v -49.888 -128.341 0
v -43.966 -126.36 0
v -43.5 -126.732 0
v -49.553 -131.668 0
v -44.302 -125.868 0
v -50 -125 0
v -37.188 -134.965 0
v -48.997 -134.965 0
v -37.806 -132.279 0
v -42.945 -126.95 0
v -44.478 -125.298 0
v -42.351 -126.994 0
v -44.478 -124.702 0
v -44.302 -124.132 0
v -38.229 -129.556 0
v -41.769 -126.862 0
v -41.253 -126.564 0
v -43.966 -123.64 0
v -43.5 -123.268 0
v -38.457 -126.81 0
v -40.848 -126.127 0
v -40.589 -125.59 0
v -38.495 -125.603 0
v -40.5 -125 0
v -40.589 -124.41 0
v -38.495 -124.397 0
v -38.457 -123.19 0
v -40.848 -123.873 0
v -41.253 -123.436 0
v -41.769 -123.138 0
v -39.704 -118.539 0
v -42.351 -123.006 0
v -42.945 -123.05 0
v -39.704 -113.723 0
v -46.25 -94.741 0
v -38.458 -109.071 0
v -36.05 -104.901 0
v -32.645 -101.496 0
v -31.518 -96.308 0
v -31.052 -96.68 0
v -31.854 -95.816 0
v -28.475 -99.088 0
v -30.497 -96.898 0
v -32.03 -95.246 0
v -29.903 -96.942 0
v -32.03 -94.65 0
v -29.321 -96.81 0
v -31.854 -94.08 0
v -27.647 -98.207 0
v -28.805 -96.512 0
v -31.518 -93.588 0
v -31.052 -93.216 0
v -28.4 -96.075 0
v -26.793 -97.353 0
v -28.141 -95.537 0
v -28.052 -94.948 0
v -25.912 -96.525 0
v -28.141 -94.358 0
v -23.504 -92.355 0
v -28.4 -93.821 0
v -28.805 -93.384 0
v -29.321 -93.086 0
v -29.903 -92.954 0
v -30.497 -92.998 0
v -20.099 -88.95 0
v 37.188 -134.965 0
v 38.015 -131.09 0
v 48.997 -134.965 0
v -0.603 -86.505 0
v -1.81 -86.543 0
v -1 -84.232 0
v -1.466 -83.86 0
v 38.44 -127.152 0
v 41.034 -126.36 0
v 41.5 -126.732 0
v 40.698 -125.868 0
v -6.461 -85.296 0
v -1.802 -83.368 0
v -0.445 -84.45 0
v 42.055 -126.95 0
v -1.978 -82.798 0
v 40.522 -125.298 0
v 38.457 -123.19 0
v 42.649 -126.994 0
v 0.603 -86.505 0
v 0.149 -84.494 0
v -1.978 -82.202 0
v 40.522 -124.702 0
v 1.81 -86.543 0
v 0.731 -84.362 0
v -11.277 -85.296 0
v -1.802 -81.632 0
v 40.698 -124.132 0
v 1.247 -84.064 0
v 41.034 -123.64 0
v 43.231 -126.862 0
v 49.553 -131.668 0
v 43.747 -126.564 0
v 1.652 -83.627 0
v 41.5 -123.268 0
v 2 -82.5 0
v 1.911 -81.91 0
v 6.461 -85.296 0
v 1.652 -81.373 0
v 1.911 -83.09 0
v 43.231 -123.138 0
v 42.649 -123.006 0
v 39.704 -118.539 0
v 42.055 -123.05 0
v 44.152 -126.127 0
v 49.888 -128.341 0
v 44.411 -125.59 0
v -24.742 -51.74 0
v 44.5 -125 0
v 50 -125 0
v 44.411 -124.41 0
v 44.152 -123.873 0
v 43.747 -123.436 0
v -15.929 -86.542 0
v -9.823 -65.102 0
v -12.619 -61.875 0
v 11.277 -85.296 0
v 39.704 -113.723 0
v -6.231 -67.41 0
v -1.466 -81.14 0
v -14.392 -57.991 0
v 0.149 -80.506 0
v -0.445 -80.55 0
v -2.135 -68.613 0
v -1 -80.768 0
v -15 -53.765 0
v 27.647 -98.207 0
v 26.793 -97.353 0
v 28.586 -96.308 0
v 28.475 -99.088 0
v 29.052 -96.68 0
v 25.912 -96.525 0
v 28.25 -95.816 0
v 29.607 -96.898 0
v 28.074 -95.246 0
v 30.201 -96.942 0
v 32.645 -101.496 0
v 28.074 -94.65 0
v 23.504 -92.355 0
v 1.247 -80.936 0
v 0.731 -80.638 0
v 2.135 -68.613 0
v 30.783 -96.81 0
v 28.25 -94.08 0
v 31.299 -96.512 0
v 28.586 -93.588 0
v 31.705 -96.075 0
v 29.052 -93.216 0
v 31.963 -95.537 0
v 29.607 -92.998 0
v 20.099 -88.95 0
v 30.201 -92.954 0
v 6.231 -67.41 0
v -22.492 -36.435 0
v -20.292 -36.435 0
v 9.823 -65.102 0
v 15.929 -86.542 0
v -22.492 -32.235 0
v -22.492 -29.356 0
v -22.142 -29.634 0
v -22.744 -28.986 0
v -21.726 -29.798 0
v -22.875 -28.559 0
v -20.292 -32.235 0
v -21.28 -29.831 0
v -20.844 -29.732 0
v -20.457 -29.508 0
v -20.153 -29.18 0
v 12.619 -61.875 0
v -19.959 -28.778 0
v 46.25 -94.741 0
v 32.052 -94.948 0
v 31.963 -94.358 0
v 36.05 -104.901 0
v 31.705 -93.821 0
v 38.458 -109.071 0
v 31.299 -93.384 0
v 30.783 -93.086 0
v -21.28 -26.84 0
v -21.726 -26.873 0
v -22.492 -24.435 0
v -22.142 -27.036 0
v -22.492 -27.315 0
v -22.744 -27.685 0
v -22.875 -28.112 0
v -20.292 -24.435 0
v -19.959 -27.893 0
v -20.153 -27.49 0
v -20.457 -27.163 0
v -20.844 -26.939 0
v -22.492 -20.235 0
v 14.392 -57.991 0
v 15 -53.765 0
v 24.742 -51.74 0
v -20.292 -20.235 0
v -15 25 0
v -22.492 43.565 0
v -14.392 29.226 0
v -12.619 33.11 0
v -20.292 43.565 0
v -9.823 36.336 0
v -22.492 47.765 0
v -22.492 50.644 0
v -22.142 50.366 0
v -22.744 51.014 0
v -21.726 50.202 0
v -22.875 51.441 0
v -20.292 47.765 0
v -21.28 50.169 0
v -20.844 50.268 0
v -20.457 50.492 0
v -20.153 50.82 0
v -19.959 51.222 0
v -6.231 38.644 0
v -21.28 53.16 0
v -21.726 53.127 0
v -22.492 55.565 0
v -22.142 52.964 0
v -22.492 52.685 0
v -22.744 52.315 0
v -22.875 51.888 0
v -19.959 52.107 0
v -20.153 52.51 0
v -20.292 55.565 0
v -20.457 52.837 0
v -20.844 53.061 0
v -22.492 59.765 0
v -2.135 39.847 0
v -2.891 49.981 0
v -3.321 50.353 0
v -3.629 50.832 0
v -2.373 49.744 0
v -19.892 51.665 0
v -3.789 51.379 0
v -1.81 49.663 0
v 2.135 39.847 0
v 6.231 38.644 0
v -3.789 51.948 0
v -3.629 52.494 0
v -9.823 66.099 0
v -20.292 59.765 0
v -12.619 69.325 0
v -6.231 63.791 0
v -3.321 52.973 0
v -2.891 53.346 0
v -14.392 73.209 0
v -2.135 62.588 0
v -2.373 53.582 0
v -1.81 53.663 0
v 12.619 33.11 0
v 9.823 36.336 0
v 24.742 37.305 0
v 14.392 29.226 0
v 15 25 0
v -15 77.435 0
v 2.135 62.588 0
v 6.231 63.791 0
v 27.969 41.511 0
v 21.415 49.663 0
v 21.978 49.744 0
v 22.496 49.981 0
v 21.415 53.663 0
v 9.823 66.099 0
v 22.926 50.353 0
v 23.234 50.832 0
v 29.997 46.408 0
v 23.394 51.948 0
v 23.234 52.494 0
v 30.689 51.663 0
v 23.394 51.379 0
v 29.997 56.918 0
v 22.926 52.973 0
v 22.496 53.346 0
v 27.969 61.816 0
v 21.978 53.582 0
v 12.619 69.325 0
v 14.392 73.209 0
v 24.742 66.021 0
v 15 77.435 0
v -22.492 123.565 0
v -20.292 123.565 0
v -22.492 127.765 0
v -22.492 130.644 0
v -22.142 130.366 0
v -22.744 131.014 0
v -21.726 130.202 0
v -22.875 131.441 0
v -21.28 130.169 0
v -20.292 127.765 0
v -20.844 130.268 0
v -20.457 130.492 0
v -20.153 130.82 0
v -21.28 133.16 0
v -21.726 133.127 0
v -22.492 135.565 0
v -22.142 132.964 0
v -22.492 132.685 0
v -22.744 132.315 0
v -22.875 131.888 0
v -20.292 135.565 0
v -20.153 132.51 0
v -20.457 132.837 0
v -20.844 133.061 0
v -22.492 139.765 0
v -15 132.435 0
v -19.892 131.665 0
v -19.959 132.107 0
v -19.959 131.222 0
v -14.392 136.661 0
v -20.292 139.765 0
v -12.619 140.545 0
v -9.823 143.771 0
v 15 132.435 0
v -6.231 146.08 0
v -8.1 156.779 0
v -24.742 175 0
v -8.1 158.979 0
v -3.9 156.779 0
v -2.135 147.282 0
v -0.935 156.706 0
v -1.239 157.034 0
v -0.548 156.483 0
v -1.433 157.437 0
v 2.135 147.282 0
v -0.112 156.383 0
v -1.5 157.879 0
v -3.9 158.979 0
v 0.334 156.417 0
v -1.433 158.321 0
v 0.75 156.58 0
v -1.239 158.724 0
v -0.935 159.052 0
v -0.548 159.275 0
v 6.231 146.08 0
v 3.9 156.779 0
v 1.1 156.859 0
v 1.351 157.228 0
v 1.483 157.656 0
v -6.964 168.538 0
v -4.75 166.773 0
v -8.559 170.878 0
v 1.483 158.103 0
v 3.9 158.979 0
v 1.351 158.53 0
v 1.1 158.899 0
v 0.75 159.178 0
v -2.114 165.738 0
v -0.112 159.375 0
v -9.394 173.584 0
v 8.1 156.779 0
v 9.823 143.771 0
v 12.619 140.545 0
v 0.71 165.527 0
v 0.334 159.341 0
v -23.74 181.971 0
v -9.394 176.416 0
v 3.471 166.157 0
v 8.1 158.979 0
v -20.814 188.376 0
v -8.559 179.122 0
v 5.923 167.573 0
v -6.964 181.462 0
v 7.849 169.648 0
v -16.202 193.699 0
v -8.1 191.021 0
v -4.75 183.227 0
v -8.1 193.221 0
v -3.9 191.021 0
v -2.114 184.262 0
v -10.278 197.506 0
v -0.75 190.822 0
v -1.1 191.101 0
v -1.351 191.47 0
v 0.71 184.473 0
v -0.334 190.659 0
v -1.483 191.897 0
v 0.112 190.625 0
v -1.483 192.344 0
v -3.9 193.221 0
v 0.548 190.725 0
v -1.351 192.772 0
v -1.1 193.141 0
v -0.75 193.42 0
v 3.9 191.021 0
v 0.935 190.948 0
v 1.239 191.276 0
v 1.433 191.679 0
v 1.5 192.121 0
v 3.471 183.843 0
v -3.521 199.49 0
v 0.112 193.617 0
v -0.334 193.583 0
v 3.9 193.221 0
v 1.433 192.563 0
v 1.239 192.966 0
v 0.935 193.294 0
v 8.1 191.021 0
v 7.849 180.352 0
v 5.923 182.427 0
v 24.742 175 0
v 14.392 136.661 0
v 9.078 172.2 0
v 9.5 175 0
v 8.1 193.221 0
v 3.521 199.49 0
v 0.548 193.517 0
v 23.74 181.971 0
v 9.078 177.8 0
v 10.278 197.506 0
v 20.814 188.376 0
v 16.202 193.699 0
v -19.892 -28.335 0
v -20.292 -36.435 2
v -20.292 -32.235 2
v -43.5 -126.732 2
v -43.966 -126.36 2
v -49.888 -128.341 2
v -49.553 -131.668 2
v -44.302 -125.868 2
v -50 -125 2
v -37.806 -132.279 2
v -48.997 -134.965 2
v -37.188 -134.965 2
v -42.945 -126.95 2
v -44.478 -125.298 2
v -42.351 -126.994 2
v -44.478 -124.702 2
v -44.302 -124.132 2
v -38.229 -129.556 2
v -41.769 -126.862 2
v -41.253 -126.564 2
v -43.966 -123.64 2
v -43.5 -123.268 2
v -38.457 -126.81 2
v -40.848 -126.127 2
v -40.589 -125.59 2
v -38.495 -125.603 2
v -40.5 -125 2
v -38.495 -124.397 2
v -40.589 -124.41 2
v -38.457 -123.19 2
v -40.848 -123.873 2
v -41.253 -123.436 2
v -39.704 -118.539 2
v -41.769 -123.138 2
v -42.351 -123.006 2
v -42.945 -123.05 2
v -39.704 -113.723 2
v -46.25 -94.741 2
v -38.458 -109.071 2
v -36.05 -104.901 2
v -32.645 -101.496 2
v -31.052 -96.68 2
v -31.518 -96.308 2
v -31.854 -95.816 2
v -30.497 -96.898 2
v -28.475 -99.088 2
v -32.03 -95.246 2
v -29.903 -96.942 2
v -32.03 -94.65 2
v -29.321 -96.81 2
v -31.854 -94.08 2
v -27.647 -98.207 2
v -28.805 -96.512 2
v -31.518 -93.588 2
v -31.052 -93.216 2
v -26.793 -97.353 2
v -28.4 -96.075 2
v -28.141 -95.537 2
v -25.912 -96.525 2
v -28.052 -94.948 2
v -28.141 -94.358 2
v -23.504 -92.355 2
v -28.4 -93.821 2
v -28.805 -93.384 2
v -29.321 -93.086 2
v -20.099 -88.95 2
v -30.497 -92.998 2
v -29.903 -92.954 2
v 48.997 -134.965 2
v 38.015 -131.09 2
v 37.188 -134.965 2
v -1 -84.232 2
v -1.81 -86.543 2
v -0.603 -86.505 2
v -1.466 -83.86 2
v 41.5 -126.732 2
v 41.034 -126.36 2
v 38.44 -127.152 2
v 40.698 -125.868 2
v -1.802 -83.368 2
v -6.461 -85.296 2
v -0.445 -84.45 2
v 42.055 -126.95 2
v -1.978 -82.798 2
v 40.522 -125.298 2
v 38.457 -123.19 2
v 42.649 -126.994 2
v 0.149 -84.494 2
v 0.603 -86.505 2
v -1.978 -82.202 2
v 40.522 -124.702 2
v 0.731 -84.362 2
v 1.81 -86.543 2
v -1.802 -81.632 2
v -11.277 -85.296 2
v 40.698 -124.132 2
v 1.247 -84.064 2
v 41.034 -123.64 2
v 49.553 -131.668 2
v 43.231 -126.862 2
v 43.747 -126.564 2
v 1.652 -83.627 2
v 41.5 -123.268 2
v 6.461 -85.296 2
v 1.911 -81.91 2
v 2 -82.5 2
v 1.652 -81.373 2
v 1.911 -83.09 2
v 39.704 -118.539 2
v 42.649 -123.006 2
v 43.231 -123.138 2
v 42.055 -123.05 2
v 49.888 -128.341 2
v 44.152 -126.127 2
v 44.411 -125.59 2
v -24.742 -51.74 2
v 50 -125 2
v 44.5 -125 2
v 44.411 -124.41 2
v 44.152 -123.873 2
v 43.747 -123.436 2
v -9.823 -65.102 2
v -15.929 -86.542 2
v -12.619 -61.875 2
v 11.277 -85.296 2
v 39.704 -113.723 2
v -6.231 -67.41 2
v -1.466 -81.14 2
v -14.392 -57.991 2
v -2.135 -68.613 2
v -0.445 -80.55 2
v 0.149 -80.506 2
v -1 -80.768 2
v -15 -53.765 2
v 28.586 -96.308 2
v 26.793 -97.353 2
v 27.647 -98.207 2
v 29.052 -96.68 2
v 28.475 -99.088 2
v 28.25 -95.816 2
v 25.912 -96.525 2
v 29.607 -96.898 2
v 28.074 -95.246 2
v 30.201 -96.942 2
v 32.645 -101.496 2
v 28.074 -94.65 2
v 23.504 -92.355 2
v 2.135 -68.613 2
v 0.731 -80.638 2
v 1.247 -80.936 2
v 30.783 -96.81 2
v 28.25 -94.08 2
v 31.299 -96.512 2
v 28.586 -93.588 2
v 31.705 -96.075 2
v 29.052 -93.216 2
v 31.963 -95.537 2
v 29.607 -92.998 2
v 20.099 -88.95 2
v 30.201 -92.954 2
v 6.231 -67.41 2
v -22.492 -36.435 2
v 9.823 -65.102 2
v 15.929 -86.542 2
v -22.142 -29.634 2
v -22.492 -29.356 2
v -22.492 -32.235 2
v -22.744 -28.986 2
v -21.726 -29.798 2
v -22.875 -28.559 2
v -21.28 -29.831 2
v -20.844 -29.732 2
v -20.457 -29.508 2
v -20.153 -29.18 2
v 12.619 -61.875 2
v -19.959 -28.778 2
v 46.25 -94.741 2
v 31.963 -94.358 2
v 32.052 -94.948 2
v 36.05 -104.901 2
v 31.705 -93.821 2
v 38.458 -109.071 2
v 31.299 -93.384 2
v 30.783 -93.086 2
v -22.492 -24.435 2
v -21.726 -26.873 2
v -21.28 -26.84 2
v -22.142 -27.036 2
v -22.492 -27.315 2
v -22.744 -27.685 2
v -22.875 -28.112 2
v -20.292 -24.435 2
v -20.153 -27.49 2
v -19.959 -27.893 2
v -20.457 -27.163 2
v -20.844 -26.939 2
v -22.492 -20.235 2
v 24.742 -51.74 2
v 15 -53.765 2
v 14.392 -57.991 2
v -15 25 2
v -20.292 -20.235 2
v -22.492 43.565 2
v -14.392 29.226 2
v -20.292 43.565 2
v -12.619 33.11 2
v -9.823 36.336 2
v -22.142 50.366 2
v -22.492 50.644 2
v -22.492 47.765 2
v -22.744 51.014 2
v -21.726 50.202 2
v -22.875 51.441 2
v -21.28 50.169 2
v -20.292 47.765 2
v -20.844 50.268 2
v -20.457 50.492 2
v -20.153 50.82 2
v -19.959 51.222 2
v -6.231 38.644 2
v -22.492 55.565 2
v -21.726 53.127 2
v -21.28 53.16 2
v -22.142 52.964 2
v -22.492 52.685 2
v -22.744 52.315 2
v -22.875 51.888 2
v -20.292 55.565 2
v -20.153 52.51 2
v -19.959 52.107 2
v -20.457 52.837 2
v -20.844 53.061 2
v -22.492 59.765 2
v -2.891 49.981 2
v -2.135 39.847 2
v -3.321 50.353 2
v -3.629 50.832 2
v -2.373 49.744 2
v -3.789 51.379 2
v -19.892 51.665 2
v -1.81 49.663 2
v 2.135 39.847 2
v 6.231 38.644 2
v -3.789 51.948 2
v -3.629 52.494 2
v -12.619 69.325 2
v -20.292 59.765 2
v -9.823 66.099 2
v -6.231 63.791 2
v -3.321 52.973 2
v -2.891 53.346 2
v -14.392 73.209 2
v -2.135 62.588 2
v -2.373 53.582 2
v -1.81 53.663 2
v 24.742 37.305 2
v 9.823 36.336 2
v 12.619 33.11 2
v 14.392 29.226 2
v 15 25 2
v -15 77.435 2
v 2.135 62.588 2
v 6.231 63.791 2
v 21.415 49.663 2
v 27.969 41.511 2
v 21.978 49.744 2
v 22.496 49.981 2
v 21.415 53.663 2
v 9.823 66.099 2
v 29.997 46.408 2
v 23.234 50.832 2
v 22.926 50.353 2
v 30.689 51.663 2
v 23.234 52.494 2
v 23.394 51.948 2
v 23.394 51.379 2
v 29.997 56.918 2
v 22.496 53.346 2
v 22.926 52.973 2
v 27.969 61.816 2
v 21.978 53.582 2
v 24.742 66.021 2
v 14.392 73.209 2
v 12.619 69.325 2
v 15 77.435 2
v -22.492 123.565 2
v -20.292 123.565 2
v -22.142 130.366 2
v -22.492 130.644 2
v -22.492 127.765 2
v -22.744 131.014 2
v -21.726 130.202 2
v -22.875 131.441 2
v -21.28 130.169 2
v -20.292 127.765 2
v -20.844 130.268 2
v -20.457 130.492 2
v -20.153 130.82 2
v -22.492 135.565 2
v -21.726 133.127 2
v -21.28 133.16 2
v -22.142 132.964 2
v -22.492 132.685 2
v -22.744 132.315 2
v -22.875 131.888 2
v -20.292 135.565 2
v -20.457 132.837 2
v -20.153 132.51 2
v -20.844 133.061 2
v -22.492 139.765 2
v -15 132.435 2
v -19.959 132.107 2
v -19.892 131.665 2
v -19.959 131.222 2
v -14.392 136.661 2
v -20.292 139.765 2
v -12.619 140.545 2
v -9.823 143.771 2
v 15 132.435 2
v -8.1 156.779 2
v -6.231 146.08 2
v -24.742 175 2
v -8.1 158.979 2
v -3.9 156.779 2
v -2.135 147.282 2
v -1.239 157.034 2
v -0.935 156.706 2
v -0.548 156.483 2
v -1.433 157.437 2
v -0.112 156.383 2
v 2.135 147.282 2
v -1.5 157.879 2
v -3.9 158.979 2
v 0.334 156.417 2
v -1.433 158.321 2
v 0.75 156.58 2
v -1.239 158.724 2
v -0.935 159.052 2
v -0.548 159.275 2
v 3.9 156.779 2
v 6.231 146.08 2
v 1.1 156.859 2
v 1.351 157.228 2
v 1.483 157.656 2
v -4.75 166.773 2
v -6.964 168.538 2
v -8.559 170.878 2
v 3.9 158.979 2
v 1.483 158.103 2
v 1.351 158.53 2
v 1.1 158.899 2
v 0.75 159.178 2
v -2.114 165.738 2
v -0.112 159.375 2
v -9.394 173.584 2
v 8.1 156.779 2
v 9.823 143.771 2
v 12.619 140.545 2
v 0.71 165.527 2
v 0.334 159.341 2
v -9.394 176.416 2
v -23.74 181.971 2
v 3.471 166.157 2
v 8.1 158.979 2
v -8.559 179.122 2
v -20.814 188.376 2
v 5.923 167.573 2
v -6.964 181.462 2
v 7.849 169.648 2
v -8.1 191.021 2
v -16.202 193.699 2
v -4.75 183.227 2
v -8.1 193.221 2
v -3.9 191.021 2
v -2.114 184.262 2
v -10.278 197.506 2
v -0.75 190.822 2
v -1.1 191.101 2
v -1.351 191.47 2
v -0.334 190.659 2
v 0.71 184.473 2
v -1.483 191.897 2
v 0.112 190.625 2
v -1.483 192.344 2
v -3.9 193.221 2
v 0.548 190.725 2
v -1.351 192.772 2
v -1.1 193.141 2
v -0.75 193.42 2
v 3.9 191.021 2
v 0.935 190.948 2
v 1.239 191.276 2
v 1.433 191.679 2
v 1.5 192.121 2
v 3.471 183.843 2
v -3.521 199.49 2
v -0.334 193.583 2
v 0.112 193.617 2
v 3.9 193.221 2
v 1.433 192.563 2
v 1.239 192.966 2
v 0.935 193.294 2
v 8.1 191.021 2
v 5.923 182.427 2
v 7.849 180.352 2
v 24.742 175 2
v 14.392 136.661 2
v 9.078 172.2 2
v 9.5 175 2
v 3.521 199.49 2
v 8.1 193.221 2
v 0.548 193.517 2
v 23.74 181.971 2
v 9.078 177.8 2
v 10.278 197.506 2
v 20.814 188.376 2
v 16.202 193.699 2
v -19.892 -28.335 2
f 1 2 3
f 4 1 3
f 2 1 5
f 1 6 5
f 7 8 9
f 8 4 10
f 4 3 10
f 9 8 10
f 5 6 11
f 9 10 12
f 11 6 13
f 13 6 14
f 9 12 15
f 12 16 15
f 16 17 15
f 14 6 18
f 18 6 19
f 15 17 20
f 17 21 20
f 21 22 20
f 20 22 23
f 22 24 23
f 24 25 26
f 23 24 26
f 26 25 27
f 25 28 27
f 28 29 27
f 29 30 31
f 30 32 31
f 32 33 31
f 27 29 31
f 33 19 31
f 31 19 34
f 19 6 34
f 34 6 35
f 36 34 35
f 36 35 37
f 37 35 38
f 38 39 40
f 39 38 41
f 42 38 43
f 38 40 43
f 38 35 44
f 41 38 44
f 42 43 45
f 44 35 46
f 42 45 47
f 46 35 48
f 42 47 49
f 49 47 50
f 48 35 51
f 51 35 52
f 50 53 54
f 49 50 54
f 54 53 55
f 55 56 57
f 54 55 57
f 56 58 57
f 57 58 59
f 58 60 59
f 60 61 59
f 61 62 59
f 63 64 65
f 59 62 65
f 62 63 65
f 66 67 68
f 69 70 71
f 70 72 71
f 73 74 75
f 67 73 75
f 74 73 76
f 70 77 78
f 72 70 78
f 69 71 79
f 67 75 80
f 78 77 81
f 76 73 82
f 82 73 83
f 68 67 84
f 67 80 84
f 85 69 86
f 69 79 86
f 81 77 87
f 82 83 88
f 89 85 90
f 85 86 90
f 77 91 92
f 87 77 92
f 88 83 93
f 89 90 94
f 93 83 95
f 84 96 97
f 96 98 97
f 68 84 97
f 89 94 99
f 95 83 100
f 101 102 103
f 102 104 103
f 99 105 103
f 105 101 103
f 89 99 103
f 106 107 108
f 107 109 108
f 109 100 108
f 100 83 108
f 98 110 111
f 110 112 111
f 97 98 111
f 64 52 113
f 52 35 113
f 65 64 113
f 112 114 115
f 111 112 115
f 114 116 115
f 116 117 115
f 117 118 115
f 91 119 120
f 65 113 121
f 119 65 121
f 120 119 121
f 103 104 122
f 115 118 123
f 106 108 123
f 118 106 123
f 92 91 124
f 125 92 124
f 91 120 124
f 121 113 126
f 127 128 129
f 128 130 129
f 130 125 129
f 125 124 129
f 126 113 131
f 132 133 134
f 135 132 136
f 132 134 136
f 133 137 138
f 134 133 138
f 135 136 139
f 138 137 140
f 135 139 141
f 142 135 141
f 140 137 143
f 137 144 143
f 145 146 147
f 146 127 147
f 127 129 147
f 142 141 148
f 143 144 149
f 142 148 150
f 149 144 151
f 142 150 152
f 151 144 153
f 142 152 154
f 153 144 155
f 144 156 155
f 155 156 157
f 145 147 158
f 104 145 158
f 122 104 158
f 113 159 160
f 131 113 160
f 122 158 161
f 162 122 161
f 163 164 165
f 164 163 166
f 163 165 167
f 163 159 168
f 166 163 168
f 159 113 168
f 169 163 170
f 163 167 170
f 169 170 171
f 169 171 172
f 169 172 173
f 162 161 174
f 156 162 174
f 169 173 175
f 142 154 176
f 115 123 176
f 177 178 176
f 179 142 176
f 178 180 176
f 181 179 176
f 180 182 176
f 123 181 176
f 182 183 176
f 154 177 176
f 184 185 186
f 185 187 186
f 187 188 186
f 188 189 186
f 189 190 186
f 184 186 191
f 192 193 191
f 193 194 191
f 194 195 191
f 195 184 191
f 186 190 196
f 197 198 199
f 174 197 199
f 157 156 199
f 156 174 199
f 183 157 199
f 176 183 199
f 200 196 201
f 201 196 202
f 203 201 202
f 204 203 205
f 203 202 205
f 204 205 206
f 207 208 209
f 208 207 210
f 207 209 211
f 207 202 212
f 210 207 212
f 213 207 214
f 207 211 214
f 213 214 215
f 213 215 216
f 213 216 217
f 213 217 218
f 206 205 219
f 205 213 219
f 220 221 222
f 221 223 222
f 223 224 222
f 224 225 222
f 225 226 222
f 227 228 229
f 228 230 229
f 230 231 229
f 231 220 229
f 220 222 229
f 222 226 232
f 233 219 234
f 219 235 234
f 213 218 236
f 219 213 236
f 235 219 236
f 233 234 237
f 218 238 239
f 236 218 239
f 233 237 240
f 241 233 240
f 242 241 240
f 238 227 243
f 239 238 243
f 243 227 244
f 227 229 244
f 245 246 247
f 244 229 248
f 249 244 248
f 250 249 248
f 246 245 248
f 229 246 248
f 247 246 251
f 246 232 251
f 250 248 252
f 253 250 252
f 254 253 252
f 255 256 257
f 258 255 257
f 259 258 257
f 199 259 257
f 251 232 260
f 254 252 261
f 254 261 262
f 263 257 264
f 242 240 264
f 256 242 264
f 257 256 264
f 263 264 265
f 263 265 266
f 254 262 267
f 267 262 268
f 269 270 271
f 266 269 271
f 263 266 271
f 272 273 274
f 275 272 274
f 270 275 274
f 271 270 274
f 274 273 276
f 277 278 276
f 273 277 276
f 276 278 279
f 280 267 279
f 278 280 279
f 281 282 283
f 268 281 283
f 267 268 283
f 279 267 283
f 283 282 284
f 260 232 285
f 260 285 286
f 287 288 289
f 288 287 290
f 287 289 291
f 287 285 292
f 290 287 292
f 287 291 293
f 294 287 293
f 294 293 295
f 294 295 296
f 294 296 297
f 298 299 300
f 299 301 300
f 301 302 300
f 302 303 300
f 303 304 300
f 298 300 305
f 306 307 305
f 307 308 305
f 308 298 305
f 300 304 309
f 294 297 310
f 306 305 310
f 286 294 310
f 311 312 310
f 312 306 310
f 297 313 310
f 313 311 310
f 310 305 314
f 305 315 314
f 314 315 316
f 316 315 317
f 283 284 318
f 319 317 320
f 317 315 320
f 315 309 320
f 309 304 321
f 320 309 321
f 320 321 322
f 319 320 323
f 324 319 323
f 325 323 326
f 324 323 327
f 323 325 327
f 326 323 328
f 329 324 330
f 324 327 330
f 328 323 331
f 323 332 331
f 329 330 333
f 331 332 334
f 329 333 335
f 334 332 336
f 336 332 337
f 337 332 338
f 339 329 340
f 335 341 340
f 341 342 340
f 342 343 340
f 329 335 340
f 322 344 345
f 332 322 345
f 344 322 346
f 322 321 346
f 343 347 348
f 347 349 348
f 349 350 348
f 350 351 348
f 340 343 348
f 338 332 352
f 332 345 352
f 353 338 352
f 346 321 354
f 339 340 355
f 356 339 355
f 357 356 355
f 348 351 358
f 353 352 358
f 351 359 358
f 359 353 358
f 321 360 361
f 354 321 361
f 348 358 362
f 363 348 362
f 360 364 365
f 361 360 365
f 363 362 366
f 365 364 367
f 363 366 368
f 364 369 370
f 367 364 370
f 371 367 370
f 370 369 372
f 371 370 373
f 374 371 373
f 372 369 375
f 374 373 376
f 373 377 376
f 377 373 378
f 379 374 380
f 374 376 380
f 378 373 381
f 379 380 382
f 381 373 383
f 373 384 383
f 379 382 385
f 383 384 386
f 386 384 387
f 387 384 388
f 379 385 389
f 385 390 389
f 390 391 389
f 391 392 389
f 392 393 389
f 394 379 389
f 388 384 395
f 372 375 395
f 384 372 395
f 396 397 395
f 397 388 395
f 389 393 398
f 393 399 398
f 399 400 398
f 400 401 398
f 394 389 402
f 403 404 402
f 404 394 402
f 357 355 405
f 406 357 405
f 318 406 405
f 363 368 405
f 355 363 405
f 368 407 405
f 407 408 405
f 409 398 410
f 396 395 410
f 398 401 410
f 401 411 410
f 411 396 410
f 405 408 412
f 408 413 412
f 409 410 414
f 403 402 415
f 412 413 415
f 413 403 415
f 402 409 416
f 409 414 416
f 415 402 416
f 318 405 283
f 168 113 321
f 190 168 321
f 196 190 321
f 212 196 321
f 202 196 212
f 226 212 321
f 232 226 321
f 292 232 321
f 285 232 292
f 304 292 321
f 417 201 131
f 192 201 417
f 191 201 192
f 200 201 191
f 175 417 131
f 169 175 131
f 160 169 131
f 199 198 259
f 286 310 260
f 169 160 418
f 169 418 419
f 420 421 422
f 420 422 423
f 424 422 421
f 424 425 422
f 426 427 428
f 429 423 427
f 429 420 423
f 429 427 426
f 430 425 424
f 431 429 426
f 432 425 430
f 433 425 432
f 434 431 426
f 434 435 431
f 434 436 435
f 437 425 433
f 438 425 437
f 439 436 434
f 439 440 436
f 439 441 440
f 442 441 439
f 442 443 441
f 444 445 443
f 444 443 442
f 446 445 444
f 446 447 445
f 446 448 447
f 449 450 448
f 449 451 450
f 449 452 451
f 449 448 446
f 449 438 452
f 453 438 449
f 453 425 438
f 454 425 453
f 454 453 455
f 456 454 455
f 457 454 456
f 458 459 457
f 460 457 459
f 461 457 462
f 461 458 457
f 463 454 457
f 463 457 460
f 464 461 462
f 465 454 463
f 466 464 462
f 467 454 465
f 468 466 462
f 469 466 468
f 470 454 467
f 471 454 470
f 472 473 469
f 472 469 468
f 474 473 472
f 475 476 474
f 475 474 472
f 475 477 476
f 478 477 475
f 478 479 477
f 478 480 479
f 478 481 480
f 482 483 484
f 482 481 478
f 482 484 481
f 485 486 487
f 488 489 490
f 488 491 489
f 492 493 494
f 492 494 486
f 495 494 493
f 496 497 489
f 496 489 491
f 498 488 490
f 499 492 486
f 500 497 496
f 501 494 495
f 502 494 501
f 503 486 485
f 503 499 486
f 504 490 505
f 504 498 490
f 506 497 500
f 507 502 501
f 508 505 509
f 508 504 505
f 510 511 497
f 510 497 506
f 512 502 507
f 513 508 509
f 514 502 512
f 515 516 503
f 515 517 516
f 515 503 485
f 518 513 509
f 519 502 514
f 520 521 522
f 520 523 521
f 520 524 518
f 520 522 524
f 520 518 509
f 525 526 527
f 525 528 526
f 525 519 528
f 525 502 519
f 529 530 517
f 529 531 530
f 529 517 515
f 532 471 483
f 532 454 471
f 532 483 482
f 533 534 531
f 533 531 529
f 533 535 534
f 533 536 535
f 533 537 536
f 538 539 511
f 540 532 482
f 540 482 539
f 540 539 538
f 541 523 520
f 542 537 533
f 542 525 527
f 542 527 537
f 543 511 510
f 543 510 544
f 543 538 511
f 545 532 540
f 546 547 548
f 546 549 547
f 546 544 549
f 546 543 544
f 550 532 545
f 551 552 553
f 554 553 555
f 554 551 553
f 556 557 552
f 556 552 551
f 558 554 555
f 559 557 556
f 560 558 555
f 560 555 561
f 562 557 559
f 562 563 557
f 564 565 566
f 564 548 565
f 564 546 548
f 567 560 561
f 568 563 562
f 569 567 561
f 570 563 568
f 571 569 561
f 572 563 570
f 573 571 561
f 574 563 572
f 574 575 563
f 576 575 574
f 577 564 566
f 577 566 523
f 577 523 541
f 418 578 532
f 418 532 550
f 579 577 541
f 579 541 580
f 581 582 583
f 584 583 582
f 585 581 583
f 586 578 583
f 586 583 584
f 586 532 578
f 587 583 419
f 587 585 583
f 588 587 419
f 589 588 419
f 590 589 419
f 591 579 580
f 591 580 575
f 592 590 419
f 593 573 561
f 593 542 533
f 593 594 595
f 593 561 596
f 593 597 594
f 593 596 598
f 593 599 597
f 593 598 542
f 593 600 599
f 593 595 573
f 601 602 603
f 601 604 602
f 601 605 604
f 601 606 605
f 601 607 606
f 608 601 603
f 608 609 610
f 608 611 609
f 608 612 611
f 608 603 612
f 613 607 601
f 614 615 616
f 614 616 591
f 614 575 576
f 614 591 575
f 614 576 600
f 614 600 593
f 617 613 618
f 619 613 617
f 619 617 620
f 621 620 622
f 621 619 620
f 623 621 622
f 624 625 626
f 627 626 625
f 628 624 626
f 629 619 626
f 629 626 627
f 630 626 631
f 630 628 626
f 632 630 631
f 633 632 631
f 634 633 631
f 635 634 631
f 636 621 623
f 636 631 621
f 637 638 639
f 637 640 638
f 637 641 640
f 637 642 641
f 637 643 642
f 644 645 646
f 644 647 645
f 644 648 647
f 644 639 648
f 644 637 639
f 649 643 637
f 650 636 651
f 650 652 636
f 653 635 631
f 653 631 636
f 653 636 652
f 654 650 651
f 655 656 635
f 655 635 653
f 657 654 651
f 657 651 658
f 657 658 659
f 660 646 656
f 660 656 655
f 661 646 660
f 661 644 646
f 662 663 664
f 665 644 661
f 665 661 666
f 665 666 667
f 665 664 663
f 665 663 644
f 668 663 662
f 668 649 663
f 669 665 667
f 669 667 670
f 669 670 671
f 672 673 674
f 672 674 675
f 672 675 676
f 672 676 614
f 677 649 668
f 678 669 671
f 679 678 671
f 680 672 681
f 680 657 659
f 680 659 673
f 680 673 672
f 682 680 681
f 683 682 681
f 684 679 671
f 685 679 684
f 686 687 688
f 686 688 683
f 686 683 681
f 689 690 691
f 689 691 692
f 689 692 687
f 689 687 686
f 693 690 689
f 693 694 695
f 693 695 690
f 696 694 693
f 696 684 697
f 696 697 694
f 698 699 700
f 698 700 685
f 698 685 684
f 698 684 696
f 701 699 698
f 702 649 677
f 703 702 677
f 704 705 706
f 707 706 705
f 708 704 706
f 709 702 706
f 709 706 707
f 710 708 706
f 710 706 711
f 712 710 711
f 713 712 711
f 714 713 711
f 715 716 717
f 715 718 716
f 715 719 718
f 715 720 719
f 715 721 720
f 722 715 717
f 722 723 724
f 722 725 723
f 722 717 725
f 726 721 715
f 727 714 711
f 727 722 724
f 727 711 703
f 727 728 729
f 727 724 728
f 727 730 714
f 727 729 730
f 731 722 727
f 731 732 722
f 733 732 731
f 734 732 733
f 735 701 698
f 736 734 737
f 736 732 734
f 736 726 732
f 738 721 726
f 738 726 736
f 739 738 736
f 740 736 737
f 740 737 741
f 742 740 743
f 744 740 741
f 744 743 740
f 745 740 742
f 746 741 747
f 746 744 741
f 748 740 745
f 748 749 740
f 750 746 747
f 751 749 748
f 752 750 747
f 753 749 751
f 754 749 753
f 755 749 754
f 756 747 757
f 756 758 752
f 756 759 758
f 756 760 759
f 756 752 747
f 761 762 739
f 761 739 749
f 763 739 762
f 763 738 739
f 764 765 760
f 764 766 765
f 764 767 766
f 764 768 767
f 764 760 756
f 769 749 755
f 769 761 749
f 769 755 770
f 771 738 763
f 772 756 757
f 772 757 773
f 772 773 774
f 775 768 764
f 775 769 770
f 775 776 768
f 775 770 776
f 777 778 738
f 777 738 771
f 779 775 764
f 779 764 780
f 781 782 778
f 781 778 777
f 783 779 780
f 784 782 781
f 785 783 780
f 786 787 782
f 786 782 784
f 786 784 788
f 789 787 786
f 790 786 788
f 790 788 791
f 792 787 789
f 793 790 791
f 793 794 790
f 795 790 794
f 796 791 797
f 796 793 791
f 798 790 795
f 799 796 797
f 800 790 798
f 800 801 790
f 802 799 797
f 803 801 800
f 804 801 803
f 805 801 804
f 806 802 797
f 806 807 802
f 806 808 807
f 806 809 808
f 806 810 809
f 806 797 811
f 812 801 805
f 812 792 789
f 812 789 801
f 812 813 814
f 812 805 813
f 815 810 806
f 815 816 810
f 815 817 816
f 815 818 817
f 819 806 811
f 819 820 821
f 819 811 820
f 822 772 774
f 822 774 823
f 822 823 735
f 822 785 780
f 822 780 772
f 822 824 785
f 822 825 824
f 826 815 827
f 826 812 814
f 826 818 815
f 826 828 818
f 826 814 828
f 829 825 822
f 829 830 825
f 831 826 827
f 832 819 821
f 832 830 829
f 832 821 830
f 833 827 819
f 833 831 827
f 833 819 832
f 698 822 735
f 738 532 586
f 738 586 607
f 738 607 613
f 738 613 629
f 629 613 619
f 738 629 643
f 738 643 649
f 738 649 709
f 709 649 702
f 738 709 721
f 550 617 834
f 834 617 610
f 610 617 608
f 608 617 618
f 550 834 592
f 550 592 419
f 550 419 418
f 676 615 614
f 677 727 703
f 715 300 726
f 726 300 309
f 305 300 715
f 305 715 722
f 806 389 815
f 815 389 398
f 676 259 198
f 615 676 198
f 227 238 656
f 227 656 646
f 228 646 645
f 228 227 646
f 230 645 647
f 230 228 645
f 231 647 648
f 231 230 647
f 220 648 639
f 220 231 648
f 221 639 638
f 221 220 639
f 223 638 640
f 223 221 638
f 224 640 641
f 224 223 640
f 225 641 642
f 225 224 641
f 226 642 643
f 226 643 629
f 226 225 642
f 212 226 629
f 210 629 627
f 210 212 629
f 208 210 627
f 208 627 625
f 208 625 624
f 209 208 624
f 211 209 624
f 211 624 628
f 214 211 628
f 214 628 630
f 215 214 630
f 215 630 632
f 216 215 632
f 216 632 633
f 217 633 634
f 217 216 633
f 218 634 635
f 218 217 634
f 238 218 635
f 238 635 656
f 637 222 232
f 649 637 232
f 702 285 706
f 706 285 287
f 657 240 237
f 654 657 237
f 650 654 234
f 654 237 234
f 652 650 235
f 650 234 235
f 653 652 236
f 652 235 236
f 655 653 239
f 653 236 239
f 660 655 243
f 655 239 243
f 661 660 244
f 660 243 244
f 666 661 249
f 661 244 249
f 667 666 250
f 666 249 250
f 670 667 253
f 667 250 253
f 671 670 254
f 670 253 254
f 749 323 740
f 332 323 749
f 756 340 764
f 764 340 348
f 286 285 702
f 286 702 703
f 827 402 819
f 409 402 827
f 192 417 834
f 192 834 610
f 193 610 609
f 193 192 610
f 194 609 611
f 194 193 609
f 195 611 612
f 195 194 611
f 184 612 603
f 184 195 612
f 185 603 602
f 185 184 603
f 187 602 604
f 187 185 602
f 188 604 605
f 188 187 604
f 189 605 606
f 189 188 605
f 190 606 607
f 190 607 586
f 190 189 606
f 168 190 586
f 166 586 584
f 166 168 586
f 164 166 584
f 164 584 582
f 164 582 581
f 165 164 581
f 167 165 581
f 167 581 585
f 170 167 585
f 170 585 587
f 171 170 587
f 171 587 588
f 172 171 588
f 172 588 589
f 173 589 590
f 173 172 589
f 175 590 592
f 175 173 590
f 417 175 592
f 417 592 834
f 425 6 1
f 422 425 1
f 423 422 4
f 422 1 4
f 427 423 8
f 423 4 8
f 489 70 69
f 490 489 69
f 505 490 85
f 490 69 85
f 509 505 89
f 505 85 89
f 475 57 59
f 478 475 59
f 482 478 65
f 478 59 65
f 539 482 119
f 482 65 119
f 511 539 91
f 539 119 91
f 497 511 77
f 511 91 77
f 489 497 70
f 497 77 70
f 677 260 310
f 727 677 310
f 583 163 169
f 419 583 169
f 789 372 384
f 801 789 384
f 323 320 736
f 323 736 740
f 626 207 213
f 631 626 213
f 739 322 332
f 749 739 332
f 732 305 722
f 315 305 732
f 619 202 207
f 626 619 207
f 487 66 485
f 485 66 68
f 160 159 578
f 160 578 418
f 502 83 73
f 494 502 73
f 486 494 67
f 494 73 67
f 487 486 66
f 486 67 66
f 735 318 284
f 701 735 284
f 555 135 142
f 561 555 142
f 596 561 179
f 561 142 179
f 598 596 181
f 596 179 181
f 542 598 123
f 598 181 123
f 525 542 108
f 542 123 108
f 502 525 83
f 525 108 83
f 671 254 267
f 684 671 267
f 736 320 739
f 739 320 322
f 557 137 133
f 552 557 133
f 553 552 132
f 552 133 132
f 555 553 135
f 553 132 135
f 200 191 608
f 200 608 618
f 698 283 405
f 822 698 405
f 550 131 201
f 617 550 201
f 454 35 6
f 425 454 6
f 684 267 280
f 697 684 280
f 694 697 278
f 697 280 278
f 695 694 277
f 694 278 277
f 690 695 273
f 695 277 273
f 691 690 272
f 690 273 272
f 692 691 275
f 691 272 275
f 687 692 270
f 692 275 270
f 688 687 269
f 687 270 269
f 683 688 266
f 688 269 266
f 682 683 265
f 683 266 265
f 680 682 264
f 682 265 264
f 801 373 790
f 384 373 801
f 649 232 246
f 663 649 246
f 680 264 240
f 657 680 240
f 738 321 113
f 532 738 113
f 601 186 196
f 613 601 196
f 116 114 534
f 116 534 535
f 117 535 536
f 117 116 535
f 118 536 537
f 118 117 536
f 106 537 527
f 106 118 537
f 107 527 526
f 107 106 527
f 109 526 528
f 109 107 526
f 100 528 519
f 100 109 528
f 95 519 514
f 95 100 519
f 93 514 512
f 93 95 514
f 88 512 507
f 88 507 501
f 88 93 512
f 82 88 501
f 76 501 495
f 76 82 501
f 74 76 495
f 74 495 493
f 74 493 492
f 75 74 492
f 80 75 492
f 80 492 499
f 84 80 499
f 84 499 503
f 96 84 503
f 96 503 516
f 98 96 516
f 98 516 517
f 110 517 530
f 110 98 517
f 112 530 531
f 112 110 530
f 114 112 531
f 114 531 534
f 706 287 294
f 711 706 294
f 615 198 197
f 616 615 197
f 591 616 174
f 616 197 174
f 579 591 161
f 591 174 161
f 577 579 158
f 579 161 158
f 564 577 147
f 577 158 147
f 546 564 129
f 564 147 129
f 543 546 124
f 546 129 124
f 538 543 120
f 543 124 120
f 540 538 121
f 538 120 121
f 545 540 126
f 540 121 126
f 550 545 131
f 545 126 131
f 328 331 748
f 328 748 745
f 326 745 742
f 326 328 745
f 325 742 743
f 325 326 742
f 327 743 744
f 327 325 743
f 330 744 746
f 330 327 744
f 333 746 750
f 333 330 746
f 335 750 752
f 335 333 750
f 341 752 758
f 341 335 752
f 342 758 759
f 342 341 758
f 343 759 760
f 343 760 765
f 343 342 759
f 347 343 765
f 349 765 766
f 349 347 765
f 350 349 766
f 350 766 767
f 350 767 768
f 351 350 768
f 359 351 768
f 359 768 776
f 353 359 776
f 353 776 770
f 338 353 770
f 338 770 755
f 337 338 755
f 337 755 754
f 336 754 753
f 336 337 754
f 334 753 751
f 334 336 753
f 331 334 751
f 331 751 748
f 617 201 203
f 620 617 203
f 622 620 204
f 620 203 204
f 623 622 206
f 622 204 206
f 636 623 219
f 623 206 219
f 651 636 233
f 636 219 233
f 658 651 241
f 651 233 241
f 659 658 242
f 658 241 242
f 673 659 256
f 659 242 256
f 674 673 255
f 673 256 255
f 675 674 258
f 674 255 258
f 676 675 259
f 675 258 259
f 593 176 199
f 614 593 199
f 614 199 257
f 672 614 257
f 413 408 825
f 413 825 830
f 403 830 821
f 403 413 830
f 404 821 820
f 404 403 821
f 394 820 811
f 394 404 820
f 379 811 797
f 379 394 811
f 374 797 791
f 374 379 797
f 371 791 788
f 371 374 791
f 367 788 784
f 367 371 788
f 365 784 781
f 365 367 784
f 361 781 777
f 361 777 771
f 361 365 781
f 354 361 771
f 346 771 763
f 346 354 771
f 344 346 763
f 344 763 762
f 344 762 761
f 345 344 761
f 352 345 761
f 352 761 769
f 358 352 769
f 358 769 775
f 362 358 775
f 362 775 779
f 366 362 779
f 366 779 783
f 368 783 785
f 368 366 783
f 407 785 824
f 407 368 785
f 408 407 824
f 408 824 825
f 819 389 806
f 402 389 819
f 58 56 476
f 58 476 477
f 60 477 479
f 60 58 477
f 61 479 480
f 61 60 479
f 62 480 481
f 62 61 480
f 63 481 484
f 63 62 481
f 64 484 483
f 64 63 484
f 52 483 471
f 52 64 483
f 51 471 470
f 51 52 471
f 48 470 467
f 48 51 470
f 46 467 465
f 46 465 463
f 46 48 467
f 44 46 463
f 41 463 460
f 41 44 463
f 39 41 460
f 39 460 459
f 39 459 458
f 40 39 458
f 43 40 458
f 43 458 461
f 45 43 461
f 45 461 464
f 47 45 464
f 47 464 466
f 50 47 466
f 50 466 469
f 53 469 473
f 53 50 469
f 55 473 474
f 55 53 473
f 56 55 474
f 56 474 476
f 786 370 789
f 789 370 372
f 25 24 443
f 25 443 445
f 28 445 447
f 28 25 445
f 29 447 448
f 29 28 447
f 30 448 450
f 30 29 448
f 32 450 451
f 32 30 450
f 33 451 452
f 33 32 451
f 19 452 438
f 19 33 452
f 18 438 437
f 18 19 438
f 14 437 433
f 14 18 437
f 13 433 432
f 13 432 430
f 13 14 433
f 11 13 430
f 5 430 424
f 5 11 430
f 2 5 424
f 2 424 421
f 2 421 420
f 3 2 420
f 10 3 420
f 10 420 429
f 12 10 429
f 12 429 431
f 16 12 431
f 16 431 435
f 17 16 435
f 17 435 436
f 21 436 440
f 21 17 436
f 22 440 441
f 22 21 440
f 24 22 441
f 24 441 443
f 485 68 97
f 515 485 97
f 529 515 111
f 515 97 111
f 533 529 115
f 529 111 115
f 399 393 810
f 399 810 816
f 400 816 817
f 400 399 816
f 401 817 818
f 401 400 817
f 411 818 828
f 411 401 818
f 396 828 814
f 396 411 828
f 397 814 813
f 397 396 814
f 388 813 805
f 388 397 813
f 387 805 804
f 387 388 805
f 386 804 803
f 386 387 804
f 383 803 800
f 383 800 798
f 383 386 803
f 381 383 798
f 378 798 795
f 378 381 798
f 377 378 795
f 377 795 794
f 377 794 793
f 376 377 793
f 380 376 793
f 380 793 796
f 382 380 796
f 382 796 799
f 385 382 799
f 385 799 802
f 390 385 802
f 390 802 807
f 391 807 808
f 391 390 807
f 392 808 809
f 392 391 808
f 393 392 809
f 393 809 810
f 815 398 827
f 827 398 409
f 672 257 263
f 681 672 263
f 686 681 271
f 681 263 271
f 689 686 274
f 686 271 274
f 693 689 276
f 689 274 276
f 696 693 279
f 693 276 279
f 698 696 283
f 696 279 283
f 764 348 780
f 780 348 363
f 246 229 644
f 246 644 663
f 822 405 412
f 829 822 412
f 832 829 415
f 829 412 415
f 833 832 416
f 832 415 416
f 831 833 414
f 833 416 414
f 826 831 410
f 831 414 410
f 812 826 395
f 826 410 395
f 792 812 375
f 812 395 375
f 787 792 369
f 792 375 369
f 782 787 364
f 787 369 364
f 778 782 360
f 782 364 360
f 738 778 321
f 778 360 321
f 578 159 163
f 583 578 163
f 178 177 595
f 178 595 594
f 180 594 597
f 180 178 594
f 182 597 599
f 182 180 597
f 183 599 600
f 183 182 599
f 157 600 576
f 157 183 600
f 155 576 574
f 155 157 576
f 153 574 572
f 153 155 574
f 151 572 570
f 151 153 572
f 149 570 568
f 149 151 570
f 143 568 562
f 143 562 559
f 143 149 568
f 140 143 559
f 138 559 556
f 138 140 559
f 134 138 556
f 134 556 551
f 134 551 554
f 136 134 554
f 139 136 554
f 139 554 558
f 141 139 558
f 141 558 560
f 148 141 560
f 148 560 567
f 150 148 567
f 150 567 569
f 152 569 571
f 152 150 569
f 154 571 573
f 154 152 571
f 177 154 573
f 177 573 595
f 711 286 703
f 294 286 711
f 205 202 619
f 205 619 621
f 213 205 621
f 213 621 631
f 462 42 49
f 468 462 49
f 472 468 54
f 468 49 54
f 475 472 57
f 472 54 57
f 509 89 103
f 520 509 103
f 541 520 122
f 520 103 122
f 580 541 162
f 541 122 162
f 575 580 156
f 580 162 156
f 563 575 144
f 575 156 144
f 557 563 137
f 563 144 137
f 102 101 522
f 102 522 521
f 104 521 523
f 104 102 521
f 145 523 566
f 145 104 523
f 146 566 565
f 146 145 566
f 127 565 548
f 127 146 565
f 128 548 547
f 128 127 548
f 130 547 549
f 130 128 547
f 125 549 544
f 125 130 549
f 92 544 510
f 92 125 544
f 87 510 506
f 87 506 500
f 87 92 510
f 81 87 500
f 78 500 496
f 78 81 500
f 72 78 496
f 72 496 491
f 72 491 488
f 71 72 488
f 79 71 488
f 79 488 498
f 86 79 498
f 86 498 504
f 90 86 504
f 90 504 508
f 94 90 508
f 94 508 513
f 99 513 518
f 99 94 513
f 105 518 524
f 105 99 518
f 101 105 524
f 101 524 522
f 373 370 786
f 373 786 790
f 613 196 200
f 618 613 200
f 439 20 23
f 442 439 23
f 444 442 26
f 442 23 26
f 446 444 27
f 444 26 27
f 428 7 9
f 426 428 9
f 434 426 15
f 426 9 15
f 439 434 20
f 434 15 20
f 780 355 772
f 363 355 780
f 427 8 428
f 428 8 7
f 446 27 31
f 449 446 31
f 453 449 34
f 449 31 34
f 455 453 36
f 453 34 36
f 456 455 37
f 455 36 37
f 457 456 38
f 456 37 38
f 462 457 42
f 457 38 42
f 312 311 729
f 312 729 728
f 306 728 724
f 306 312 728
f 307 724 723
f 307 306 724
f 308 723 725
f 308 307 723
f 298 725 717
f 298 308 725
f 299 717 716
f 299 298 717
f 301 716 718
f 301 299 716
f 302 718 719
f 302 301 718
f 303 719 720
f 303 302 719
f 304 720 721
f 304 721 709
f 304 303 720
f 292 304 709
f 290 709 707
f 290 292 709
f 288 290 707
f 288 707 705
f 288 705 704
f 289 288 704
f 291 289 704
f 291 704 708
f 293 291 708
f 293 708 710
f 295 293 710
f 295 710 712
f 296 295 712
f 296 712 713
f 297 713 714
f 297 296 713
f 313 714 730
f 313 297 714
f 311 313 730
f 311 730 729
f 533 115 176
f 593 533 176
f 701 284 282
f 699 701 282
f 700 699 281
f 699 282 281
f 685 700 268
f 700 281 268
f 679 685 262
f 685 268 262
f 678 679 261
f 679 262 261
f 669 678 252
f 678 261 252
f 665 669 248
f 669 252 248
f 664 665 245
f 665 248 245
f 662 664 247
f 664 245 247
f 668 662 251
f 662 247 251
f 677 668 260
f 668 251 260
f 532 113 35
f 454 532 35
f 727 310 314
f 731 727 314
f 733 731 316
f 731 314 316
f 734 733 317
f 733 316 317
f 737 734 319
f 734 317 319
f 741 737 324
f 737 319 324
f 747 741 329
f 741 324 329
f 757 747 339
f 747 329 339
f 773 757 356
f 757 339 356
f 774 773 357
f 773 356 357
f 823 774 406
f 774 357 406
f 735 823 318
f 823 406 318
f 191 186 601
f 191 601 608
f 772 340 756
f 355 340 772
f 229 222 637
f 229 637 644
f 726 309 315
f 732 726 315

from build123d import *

# Parameters (mm, degrees)
SKETCH_1_R      = 2
SKETCH_1_R_2    = 9.5
SKETCH_1_R_3    = 1.5
SKETCH_1_W      = 4.2
SKETCH_1_H      = 2.2
SKETCH_1_W_2    = 2.2
SKETCH_1_H_2    = 4.2
EXTRUDE_1_DEPTH = 2


with BuildPart() as part:
    # 草图1 → 凸台-拉伸1 (new body)
    with BuildSketch(Plane.XY):
        with BuildLine():
            Line((37.188144312, -134.964533236), (48.99702068, -134.964533236))
            ThreePointArc((48.99702068, -134.964533236), (49.748623267, -130.007441715), (50, -125))
            Line((50, -125), (46.25, -94.741478673))
            Line((46.25, -94.741478673), (24.741807932, -51.739753072))
            Line((24.741807932, -51.739753072), (24.741807932, 0))
            Line((24.741807932, 0), (24.741807932, 37.305457961))
            ThreePointArc((24.741807932, 37.305457961), (30.688954295, 51.663139366), (24.741807932, 66.020820772))
            Line((24.741807932, 66.020820772), (24.741807932, 175))
            ThreePointArc((24.741807932, 175), (0, 199.741807932), (-24.741807932, 175))
            Line((-24.741807932, 175), (-24.741807932, 0))
            Line((-24.741807932, 0), (-24.741807932, -51.739753072))
            Line((-24.741807932, -51.739753072), (-46.25, -94.741478673))
            Line((-46.25, -94.741478673), (-50, -125))
            ThreePointArc((-50, -125), (-49.748623375, -130.007441694), (-48.997021107, -134.964533236))
            Line((-48.997021107, -134.964533236), (-37.188144312, -134.964533236))
            ThreePointArc((-37.188144312, -134.964533236), (-38.041933638, -130.921257055), (-38.457440916, -126.809761925))
            ThreePointArc((-38.457440916, -126.809761925), (-38.5, -125), (-38.457440916, -123.190238075))
            ThreePointArc((-38.457440916, -123.190238075), (-38.457808555, -109.071427319), (-28.474561687, -99.087660532))
            ThreePointArc((-28.474561687, -99.087660532), (-27.223611076, -97.776388924), (-25.912339468, -96.525438313))
            ThreePointArc((-25.912339468, -96.525438313), (-15.928572681, -86.542191445), (-1.809761925, -86.542559084))
            ThreePointArc((-1.809761925, -86.542559084), (0, -86.5), (1.809761925, -86.542559084))
            ThreePointArc((1.809761925, -86.542559084), (15.928572681, -86.542191445), (25.912339468, -96.525438313))
            ThreePointArc((25.912339468, -96.525438313), (27.223611076, -97.776388924), (28.474561687, -99.087660532))
            ThreePointArc((28.474561687, -99.087660532), (38.457808555, -109.071427319), (38.457440916, -123.190238075))
            ThreePointArc((38.457440916, -123.190238075), (38.278220279, -129.126481825), (37.188144312, -134.964533236))
        make_face()
        with Locations((-42.5, -125)):
            Circle(SKETCH_1_R, mode=Mode.SUBTRACT)
        with Locations((-30.0520382, -94.9479618)):
            Circle(SKETCH_1_R, mode=Mode.SUBTRACT)
        with Locations((0, -82.5)):
            Circle(SKETCH_1_R, mode=Mode.SUBTRACT)
        with Locations((30.0520382, -94.9479618)):
            Circle(SKETCH_1_R, mode=Mode.SUBTRACT)
        with Locations((42.5, -125)):
            Circle(SKETCH_1_R, mode=Mode.SUBTRACT)
        with Locations((0, 175)):
            Circle(SKETCH_1_R_2, mode=Mode.SUBTRACT)
        with Locations((0, 192.120903966)):
            Circle(SKETCH_1_R_3, mode=Mode.SUBTRACT)
        with Locations(Location((0, 157.879096034, 0), (0, 0, 180))):
            Circle(SKETCH_1_R_3, mode=Mode.SUBTRACT)
        with Locations((-21.392054648, -28.335407124)):
            Circle(SKETCH_1_R_3, mode=Mode.SUBTRACT)
        with Locations((-21.392054648, 51.664592876)):
            Circle(SKETCH_1_R_3, mode=Mode.SUBTRACT)
        with Locations((-21.392054648, 131.664592876)):
            Circle(SKETCH_1_R_3, mode=Mode.SUBTRACT)
        with Locations((6, 192.120903966)):
            Rectangle(SKETCH_1_W, SKETCH_1_H, mode=Mode.SUBTRACT)
        with BuildLine():
            Line((21.41471253, 49.663139366), (-1.809761925, 49.663139366))
            ThreePointArc((-1.809761925, 49.663139366), (-3.809761925, 51.663139366), (-1.809761925, 53.663139366))
            Line((-1.809761925, 53.663139366), (21.41471253, 53.663139366))
            ThreePointArc((21.41471253, 53.663139366), (23.41471253, 51.663139366), (21.41471253, 49.663139366))
        make_face(mode=Mode.SUBTRACT)
        with Locations((-6, 192.120903966)):
            Rectangle(SKETCH_1_W, SKETCH_1_H, mode=Mode.SUBTRACT)
        with Locations((-21.392054648, 57.664592876)):
            Rectangle(SKETCH_1_W_2, SKETCH_1_H_2, mode=Mode.SUBTRACT)
        with Locations((-6, 157.879096034)):
            Rectangle(SKETCH_1_W, SKETCH_1_H, mode=Mode.SUBTRACT)
        with Locations((6, 157.879096034)):
            Rectangle(SKETCH_1_W, SKETCH_1_H, mode=Mode.SUBTRACT)
        with BuildLine():
            Line((-15, -53.7654447), (-15, 25))
            ThreePointArc((-15, 25), (0, 40), (15, 25))
            Line((15, 25), (15, -53.7654447))
            ThreePointArc((15, -53.7654447), (0, -68.7654447), (-15, -53.7654447))
        make_face(mode=Mode.SUBTRACT)
        with Locations((-21.392054648, -22.335407124)):
            Rectangle(SKETCH_1_W_2, SKETCH_1_H_2, mode=Mode.SUBTRACT)
        with Locations((-21.392054648, -34.335407124)):
            Rectangle(SKETCH_1_W_2, SKETCH_1_H_2, mode=Mode.SUBTRACT)
        with Locations((-21.392054648, 45.664592876)):
            Rectangle(SKETCH_1_W_2, SKETCH_1_H_2, mode=Mode.SUBTRACT)
        with BuildLine():
            Line((-15, 77.43505255), (-15, 132.43505255))
            ThreePointArc((-15, 132.43505255), (0, 147.43505255), (15, 132.43505255))
            Line((15, 132.43505255), (15, 77.43505255))
            ThreePointArc((15, 77.43505255), (0, 62.43505255), (-15, 77.43505255))
        make_face(mode=Mode.SUBTRACT)
        with Locations((-21.392054648, 137.664592876)):
            Rectangle(SKETCH_1_W_2, SKETCH_1_H_2, mode=Mode.SUBTRACT)
        with Locations((-21.392054648, 125.664592876)):
            Rectangle(SKETCH_1_W_2, SKETCH_1_H_2, mode=Mode.SUBTRACT)
    extrude(amount=EXTRUDE_1_DEPTH)


solid = part.part
